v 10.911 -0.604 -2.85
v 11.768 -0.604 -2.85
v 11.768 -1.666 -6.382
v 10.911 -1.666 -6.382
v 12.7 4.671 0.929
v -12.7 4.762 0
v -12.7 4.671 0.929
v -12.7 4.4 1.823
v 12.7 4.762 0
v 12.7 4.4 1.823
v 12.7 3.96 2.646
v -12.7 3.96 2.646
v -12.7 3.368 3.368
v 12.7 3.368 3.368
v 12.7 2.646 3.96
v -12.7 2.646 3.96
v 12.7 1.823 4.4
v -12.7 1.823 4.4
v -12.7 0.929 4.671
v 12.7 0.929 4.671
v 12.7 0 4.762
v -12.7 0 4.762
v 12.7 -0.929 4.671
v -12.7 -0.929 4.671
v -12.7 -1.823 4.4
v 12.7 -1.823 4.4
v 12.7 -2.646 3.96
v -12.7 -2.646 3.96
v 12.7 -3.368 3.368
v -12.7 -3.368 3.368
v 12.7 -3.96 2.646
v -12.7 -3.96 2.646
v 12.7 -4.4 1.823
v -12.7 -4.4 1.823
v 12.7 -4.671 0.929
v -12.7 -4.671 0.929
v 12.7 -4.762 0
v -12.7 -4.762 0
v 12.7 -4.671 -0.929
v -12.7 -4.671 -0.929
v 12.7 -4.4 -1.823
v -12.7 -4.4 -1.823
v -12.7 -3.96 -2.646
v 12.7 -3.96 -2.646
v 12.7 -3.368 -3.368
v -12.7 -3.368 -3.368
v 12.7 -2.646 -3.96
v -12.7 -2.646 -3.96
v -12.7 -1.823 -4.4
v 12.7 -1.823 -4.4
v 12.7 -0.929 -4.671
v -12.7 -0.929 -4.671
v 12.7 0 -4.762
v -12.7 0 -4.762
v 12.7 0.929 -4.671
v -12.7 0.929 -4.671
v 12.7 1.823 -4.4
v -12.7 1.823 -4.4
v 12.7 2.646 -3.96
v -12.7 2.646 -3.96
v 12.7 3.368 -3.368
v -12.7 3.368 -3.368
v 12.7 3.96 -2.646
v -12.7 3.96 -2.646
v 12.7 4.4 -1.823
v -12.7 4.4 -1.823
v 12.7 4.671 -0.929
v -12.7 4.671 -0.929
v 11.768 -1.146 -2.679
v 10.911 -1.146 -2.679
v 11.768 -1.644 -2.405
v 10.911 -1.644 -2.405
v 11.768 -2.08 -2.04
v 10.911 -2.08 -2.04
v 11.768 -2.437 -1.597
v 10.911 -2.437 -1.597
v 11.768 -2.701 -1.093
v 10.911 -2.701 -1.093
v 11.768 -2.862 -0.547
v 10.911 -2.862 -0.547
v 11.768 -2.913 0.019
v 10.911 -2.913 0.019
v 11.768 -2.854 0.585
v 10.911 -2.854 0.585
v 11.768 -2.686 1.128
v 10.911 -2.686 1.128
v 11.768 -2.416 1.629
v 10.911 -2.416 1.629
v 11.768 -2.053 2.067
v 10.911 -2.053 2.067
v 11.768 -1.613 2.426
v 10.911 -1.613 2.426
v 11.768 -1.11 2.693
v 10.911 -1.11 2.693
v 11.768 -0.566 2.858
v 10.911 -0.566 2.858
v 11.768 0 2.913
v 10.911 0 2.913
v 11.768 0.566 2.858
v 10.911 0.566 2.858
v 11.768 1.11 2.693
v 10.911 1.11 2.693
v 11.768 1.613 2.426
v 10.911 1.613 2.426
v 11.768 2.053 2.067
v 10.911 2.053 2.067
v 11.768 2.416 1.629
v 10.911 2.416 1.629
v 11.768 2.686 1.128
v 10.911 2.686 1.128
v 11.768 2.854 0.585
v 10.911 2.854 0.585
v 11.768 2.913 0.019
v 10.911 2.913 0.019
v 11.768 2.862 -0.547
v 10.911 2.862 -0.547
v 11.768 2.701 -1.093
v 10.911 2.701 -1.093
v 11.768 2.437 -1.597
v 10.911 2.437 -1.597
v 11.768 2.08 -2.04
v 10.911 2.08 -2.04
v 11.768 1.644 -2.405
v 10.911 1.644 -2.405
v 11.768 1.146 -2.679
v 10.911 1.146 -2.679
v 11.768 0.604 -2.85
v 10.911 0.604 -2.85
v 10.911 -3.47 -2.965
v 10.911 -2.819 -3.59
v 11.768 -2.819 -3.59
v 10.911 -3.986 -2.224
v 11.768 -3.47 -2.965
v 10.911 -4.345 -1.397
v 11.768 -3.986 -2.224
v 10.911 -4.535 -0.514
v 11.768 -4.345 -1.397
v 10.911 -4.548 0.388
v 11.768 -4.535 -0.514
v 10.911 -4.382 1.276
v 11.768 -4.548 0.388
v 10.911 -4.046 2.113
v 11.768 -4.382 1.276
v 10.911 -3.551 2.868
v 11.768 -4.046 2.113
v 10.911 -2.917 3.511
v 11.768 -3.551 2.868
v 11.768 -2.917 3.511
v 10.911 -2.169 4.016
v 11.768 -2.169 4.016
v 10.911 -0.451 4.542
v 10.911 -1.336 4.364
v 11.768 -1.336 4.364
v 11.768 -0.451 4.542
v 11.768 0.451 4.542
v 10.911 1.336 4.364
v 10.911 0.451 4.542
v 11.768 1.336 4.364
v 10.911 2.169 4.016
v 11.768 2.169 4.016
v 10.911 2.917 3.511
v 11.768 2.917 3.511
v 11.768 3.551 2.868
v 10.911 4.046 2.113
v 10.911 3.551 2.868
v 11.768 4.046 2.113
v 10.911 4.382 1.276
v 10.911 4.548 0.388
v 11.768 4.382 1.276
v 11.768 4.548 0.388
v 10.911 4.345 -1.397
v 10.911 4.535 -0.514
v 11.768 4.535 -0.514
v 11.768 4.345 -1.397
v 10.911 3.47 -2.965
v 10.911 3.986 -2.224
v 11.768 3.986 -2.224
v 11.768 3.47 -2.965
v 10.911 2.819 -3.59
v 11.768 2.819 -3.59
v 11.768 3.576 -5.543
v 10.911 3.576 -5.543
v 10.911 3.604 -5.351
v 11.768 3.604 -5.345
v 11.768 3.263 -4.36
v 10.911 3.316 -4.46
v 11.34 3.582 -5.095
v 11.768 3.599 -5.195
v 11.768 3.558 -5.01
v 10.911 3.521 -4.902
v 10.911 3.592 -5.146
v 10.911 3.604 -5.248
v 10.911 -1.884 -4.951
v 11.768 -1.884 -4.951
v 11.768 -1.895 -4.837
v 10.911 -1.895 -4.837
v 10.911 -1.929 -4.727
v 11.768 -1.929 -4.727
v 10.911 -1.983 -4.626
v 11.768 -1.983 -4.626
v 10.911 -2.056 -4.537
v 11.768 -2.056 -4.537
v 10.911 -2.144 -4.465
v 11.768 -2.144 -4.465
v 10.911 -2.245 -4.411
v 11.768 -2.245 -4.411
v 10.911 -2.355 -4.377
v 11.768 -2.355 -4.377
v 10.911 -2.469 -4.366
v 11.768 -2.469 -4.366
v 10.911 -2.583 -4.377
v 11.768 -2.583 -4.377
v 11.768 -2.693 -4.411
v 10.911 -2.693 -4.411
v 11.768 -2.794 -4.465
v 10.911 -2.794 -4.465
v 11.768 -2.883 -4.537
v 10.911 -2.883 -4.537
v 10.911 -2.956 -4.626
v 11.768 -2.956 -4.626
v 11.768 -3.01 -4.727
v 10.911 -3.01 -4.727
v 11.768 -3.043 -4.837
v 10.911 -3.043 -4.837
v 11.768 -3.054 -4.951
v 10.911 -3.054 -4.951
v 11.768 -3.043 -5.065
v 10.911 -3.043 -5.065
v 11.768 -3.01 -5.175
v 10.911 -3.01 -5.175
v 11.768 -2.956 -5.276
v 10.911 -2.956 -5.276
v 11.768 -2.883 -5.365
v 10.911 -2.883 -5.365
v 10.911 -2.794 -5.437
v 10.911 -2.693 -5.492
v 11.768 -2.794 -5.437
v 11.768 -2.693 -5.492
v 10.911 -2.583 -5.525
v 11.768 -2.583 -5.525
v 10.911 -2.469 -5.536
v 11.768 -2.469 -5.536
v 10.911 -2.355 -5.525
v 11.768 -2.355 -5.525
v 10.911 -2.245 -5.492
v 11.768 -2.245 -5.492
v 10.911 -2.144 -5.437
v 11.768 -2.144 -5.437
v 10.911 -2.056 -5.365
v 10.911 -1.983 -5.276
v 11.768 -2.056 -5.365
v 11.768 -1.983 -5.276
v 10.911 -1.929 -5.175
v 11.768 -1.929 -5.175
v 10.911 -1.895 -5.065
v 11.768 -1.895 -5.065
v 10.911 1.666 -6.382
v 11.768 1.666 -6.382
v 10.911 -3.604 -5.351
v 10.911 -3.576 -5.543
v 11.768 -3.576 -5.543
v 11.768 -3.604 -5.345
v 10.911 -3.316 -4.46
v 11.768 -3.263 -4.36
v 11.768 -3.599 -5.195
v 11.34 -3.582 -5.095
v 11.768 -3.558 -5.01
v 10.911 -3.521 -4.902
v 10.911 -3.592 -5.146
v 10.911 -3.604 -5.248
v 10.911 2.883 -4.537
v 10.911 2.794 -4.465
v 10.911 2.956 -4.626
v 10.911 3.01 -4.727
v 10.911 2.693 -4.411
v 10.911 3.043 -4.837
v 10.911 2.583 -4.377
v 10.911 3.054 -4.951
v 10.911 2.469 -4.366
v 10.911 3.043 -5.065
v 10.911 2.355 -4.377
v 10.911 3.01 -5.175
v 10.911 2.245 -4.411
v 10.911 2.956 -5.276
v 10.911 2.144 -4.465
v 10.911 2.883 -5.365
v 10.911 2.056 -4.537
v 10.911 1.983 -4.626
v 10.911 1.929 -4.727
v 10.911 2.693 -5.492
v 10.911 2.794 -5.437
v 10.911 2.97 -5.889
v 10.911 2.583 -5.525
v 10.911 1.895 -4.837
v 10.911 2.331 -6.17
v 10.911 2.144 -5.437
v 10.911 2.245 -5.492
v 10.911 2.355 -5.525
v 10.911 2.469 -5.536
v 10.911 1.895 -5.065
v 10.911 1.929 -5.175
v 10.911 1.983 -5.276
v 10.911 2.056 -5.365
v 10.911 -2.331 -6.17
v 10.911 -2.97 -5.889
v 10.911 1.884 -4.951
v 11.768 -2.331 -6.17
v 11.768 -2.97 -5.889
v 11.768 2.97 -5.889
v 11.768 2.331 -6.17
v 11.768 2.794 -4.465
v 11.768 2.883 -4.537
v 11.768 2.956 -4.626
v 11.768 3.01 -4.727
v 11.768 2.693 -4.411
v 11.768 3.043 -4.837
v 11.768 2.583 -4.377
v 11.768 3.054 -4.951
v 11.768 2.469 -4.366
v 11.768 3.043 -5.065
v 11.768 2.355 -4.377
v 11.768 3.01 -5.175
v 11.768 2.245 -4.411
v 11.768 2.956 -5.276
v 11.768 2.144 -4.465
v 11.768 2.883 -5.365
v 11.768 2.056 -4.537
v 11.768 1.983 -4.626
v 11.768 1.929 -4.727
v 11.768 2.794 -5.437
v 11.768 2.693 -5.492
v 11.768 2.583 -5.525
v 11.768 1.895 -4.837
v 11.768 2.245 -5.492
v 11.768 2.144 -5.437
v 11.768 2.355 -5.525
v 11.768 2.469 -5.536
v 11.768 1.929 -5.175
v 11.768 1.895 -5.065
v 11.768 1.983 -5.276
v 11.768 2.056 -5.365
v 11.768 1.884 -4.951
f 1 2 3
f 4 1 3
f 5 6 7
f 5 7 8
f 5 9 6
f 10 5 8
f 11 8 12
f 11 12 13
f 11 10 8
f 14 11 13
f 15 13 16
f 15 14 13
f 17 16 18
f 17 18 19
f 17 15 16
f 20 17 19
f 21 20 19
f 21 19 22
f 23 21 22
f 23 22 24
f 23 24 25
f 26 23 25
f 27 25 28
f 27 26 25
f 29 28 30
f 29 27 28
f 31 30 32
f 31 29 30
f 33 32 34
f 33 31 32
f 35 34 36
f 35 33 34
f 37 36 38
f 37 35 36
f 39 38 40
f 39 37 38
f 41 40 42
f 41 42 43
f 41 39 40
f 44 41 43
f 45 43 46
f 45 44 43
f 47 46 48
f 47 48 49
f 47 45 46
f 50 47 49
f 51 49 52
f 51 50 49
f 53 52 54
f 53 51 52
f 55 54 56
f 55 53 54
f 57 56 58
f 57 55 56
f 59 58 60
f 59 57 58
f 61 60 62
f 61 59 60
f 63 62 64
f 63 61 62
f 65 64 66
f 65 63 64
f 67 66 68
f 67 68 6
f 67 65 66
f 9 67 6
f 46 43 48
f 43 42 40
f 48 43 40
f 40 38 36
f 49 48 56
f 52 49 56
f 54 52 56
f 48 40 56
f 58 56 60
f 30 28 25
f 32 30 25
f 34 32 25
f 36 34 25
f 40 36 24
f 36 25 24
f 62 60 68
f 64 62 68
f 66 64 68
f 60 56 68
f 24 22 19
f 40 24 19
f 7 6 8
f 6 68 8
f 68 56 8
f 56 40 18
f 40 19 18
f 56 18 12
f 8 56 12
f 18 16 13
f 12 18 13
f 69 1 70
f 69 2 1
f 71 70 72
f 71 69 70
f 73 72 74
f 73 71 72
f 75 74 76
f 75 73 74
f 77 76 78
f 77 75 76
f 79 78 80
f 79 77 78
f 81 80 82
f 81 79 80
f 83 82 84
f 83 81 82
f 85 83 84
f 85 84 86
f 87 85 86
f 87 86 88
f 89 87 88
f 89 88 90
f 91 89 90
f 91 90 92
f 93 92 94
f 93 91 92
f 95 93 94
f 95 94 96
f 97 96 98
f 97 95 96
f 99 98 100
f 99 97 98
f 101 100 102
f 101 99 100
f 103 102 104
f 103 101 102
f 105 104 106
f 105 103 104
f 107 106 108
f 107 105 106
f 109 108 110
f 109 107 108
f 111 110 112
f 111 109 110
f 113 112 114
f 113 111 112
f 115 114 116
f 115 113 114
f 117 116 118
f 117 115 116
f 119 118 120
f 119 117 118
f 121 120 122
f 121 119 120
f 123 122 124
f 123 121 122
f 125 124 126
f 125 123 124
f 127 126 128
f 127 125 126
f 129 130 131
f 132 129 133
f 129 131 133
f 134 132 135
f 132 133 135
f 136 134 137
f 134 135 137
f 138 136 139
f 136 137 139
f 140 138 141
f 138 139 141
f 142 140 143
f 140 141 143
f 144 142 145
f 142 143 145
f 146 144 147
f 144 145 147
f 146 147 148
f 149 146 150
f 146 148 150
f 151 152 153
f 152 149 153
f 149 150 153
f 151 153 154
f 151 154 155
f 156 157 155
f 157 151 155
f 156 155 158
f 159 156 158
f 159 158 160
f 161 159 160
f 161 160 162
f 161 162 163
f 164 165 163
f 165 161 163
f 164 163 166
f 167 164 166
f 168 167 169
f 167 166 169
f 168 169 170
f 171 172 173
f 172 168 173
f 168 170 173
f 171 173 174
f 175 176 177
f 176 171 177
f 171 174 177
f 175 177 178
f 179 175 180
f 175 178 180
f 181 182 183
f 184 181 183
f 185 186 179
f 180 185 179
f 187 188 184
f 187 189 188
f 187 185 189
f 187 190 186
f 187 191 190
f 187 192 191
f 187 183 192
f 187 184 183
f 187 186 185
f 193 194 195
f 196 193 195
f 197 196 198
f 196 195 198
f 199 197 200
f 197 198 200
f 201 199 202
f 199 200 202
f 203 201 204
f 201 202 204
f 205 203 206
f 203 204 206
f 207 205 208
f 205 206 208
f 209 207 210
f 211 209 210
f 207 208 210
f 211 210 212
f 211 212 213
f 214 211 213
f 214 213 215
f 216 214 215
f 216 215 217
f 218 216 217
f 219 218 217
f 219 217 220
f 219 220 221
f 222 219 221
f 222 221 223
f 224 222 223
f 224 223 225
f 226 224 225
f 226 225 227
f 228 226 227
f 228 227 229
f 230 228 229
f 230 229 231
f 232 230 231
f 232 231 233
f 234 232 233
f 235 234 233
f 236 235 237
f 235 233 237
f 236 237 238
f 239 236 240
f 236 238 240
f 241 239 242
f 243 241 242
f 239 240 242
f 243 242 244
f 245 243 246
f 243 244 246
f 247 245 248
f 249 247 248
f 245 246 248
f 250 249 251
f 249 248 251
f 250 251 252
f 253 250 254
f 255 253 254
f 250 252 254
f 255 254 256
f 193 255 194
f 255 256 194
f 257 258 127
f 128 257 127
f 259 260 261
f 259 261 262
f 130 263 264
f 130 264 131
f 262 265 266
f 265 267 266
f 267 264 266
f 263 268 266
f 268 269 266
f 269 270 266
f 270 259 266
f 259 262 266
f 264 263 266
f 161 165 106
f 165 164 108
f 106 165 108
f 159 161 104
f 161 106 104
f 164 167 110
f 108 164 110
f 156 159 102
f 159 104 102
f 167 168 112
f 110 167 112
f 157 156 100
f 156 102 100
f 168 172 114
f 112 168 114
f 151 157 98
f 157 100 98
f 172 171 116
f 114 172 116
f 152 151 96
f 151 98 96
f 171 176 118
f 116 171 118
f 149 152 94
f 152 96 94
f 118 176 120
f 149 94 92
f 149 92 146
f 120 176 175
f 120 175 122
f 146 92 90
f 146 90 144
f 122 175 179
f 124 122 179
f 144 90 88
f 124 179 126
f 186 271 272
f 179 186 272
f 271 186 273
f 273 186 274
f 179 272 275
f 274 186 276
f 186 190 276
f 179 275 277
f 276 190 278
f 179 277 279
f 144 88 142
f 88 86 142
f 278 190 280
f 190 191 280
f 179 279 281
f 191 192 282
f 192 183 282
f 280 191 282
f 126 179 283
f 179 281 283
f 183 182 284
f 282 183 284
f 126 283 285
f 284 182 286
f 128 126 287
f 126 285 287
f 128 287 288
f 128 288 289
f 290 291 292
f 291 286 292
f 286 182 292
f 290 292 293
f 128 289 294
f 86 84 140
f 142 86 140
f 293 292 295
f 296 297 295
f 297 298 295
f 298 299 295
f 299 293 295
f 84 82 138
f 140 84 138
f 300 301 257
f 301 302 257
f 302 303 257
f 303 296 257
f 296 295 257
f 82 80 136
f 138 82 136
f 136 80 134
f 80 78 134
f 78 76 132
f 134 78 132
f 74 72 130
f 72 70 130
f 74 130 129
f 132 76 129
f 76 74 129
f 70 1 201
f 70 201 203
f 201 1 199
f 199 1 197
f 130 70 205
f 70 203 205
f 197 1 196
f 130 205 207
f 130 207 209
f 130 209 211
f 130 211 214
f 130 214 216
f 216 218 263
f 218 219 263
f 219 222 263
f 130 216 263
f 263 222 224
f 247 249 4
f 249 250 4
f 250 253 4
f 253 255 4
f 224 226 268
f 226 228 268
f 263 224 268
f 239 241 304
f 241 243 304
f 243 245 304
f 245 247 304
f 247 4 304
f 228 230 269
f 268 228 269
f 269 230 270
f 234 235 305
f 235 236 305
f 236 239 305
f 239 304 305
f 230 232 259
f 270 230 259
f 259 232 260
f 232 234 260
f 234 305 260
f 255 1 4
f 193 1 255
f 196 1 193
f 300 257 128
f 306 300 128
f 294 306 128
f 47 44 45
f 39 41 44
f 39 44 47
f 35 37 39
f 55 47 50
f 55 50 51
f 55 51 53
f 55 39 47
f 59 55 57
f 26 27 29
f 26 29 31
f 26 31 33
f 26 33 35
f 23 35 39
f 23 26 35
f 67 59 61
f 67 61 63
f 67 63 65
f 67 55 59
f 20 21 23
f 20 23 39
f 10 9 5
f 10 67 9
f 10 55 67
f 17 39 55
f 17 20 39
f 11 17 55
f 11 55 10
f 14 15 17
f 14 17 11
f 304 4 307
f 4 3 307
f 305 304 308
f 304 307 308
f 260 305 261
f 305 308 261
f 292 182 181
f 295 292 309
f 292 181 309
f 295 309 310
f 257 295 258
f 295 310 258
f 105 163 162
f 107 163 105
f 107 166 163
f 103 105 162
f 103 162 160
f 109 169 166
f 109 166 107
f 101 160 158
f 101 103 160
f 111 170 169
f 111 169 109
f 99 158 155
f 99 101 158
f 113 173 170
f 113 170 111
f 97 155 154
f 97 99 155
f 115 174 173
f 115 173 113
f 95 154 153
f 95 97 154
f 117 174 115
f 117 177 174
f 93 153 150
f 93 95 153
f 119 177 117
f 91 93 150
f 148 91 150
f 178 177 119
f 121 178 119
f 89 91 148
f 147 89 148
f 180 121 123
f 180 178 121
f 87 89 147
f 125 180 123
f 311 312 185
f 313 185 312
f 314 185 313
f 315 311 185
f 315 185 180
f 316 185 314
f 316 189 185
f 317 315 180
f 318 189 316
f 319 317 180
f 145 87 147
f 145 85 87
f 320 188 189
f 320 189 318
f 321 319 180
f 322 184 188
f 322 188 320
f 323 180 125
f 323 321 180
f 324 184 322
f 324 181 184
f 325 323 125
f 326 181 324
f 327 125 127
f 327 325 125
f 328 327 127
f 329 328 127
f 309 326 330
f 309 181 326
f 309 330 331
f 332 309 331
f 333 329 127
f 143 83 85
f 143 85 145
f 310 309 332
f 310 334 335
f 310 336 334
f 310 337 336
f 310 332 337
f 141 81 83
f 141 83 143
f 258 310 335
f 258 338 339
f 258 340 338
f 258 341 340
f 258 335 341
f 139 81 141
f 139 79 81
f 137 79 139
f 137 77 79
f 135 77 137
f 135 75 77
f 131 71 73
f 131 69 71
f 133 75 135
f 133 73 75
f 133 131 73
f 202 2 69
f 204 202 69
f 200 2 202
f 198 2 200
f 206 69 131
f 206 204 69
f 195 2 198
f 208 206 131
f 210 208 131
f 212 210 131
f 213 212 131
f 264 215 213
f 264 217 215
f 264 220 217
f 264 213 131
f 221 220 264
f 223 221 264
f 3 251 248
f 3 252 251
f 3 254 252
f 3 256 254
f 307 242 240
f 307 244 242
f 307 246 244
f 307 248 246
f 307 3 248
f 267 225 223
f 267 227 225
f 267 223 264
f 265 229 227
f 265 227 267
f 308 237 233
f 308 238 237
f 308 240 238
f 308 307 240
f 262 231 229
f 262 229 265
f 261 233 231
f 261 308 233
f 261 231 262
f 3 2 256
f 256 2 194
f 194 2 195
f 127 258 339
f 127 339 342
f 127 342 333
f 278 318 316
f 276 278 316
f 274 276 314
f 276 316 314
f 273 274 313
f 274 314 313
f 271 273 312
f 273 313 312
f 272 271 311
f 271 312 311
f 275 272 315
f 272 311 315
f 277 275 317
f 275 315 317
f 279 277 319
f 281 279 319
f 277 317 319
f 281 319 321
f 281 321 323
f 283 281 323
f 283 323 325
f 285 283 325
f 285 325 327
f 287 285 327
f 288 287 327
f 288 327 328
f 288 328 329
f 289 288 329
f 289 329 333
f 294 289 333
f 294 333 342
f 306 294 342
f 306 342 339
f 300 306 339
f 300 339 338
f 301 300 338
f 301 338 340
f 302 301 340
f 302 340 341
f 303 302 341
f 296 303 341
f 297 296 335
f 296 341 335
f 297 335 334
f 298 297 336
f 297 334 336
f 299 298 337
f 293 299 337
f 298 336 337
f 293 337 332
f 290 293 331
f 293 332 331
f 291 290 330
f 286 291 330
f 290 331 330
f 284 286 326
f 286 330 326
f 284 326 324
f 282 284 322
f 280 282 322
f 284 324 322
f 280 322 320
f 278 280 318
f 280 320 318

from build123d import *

# Parameters (mm, degrees)
F0_R     = 4.7625
F1_DEPTH = 12.7
F2_W     = 0.8572917432
F2_H     = 3.6824136041
F5_R     = 0.5850055068
F6_DEPTH = 25.4


with BuildPart() as f1:
    # F0 (on Right) → F1 (new body)
    with BuildSketch(Plane.YZ):
        Circle(F0_R)
    extrude(amount=F1_DEPTH)

    # F4: F1 across plane


with BuildPart() as f3:
    # F2 (on Top) → F3 (revolve)
    with BuildSketch(Plane.XY):
        with Locations((11.3397957757, 4.7545640264)):
            Rectangle(F2_W, F2_H)
    revolve(axis=Axis((11.6089691874, 0, 0), (-1, 0, 0)))

    # F5 (on face) → F6 (cut)
    with BuildSketch(Plane.YZ.offset(11.7684416473)):
        with BuildLine():
            ThreePointArc((0.6035996611, -2.850143464), (0, -2.9133572243), (-0.6035996611, -2.850143464))
            Line((-0.6035996611, -2.850143464), (-1.6657512694, -6.3819640809))
            ThreePointArc((-1.6657512694, -6.3819640809), (0, -6.5957708284), (1.6657512694, -6.3819640809))
            Line((1.6657512694, -6.3819640809), (0.6035996611, -2.850143464))
        make_face()
        with BuildLine():
            ThreePointArc((6.5957708284, 0), (-3.156008436, 5.7917012676), (-3.5755357392, -5.5425388586))
            add(Edge.make_bspline(
                [(-3.5755357392, -5.5425388586), (-3.6011746585, -5.4133196937), (-3.6721900788, -5.0271716823), (-3.1553549859, -4.1579107621), (-2.8186723188, -3.5900480977)],
                knots=[0, 0, 0, 0, 0.3399807639, 1, 1, 1, 1], degree=3))
            ThreePointArc((-2.8186723188, -3.5900480977), (0, 4.5643574558), (2.8186723188, -3.5900480977))
            add(Edge.make_bspline(
                [(3.5755357392, -5.5425388586), (3.6011746585, -5.4133196937), (3.6721900788, -5.0271716823), (3.1553549859, -4.1579107621), (2.8186723188, -3.5900480977)],
                knots=[0, 0, 0, 0, 0.3399807639, 1, 1, 1, 1], degree=3))
            ThreePointArc((3.5755357392, -5.5425388586), (5.7917012676, -3.156008436), (6.5957708284, 0))
        make_face()
        with Locations((-2.4692576844, -4.9510691315)):
            Circle(F5_R)
        with Locations((2.4692576844, -4.9510691315)):
            Circle(F5_R)
    extrude(amount=-F6_DEPTH, mode=Mode.SUBTRACT)


with BuildPart() as f1_1:
    add(f1.part)
    add(f1.part.mirror(Plane.YZ))


solid = Compound([f3.part, f1_1.part])
